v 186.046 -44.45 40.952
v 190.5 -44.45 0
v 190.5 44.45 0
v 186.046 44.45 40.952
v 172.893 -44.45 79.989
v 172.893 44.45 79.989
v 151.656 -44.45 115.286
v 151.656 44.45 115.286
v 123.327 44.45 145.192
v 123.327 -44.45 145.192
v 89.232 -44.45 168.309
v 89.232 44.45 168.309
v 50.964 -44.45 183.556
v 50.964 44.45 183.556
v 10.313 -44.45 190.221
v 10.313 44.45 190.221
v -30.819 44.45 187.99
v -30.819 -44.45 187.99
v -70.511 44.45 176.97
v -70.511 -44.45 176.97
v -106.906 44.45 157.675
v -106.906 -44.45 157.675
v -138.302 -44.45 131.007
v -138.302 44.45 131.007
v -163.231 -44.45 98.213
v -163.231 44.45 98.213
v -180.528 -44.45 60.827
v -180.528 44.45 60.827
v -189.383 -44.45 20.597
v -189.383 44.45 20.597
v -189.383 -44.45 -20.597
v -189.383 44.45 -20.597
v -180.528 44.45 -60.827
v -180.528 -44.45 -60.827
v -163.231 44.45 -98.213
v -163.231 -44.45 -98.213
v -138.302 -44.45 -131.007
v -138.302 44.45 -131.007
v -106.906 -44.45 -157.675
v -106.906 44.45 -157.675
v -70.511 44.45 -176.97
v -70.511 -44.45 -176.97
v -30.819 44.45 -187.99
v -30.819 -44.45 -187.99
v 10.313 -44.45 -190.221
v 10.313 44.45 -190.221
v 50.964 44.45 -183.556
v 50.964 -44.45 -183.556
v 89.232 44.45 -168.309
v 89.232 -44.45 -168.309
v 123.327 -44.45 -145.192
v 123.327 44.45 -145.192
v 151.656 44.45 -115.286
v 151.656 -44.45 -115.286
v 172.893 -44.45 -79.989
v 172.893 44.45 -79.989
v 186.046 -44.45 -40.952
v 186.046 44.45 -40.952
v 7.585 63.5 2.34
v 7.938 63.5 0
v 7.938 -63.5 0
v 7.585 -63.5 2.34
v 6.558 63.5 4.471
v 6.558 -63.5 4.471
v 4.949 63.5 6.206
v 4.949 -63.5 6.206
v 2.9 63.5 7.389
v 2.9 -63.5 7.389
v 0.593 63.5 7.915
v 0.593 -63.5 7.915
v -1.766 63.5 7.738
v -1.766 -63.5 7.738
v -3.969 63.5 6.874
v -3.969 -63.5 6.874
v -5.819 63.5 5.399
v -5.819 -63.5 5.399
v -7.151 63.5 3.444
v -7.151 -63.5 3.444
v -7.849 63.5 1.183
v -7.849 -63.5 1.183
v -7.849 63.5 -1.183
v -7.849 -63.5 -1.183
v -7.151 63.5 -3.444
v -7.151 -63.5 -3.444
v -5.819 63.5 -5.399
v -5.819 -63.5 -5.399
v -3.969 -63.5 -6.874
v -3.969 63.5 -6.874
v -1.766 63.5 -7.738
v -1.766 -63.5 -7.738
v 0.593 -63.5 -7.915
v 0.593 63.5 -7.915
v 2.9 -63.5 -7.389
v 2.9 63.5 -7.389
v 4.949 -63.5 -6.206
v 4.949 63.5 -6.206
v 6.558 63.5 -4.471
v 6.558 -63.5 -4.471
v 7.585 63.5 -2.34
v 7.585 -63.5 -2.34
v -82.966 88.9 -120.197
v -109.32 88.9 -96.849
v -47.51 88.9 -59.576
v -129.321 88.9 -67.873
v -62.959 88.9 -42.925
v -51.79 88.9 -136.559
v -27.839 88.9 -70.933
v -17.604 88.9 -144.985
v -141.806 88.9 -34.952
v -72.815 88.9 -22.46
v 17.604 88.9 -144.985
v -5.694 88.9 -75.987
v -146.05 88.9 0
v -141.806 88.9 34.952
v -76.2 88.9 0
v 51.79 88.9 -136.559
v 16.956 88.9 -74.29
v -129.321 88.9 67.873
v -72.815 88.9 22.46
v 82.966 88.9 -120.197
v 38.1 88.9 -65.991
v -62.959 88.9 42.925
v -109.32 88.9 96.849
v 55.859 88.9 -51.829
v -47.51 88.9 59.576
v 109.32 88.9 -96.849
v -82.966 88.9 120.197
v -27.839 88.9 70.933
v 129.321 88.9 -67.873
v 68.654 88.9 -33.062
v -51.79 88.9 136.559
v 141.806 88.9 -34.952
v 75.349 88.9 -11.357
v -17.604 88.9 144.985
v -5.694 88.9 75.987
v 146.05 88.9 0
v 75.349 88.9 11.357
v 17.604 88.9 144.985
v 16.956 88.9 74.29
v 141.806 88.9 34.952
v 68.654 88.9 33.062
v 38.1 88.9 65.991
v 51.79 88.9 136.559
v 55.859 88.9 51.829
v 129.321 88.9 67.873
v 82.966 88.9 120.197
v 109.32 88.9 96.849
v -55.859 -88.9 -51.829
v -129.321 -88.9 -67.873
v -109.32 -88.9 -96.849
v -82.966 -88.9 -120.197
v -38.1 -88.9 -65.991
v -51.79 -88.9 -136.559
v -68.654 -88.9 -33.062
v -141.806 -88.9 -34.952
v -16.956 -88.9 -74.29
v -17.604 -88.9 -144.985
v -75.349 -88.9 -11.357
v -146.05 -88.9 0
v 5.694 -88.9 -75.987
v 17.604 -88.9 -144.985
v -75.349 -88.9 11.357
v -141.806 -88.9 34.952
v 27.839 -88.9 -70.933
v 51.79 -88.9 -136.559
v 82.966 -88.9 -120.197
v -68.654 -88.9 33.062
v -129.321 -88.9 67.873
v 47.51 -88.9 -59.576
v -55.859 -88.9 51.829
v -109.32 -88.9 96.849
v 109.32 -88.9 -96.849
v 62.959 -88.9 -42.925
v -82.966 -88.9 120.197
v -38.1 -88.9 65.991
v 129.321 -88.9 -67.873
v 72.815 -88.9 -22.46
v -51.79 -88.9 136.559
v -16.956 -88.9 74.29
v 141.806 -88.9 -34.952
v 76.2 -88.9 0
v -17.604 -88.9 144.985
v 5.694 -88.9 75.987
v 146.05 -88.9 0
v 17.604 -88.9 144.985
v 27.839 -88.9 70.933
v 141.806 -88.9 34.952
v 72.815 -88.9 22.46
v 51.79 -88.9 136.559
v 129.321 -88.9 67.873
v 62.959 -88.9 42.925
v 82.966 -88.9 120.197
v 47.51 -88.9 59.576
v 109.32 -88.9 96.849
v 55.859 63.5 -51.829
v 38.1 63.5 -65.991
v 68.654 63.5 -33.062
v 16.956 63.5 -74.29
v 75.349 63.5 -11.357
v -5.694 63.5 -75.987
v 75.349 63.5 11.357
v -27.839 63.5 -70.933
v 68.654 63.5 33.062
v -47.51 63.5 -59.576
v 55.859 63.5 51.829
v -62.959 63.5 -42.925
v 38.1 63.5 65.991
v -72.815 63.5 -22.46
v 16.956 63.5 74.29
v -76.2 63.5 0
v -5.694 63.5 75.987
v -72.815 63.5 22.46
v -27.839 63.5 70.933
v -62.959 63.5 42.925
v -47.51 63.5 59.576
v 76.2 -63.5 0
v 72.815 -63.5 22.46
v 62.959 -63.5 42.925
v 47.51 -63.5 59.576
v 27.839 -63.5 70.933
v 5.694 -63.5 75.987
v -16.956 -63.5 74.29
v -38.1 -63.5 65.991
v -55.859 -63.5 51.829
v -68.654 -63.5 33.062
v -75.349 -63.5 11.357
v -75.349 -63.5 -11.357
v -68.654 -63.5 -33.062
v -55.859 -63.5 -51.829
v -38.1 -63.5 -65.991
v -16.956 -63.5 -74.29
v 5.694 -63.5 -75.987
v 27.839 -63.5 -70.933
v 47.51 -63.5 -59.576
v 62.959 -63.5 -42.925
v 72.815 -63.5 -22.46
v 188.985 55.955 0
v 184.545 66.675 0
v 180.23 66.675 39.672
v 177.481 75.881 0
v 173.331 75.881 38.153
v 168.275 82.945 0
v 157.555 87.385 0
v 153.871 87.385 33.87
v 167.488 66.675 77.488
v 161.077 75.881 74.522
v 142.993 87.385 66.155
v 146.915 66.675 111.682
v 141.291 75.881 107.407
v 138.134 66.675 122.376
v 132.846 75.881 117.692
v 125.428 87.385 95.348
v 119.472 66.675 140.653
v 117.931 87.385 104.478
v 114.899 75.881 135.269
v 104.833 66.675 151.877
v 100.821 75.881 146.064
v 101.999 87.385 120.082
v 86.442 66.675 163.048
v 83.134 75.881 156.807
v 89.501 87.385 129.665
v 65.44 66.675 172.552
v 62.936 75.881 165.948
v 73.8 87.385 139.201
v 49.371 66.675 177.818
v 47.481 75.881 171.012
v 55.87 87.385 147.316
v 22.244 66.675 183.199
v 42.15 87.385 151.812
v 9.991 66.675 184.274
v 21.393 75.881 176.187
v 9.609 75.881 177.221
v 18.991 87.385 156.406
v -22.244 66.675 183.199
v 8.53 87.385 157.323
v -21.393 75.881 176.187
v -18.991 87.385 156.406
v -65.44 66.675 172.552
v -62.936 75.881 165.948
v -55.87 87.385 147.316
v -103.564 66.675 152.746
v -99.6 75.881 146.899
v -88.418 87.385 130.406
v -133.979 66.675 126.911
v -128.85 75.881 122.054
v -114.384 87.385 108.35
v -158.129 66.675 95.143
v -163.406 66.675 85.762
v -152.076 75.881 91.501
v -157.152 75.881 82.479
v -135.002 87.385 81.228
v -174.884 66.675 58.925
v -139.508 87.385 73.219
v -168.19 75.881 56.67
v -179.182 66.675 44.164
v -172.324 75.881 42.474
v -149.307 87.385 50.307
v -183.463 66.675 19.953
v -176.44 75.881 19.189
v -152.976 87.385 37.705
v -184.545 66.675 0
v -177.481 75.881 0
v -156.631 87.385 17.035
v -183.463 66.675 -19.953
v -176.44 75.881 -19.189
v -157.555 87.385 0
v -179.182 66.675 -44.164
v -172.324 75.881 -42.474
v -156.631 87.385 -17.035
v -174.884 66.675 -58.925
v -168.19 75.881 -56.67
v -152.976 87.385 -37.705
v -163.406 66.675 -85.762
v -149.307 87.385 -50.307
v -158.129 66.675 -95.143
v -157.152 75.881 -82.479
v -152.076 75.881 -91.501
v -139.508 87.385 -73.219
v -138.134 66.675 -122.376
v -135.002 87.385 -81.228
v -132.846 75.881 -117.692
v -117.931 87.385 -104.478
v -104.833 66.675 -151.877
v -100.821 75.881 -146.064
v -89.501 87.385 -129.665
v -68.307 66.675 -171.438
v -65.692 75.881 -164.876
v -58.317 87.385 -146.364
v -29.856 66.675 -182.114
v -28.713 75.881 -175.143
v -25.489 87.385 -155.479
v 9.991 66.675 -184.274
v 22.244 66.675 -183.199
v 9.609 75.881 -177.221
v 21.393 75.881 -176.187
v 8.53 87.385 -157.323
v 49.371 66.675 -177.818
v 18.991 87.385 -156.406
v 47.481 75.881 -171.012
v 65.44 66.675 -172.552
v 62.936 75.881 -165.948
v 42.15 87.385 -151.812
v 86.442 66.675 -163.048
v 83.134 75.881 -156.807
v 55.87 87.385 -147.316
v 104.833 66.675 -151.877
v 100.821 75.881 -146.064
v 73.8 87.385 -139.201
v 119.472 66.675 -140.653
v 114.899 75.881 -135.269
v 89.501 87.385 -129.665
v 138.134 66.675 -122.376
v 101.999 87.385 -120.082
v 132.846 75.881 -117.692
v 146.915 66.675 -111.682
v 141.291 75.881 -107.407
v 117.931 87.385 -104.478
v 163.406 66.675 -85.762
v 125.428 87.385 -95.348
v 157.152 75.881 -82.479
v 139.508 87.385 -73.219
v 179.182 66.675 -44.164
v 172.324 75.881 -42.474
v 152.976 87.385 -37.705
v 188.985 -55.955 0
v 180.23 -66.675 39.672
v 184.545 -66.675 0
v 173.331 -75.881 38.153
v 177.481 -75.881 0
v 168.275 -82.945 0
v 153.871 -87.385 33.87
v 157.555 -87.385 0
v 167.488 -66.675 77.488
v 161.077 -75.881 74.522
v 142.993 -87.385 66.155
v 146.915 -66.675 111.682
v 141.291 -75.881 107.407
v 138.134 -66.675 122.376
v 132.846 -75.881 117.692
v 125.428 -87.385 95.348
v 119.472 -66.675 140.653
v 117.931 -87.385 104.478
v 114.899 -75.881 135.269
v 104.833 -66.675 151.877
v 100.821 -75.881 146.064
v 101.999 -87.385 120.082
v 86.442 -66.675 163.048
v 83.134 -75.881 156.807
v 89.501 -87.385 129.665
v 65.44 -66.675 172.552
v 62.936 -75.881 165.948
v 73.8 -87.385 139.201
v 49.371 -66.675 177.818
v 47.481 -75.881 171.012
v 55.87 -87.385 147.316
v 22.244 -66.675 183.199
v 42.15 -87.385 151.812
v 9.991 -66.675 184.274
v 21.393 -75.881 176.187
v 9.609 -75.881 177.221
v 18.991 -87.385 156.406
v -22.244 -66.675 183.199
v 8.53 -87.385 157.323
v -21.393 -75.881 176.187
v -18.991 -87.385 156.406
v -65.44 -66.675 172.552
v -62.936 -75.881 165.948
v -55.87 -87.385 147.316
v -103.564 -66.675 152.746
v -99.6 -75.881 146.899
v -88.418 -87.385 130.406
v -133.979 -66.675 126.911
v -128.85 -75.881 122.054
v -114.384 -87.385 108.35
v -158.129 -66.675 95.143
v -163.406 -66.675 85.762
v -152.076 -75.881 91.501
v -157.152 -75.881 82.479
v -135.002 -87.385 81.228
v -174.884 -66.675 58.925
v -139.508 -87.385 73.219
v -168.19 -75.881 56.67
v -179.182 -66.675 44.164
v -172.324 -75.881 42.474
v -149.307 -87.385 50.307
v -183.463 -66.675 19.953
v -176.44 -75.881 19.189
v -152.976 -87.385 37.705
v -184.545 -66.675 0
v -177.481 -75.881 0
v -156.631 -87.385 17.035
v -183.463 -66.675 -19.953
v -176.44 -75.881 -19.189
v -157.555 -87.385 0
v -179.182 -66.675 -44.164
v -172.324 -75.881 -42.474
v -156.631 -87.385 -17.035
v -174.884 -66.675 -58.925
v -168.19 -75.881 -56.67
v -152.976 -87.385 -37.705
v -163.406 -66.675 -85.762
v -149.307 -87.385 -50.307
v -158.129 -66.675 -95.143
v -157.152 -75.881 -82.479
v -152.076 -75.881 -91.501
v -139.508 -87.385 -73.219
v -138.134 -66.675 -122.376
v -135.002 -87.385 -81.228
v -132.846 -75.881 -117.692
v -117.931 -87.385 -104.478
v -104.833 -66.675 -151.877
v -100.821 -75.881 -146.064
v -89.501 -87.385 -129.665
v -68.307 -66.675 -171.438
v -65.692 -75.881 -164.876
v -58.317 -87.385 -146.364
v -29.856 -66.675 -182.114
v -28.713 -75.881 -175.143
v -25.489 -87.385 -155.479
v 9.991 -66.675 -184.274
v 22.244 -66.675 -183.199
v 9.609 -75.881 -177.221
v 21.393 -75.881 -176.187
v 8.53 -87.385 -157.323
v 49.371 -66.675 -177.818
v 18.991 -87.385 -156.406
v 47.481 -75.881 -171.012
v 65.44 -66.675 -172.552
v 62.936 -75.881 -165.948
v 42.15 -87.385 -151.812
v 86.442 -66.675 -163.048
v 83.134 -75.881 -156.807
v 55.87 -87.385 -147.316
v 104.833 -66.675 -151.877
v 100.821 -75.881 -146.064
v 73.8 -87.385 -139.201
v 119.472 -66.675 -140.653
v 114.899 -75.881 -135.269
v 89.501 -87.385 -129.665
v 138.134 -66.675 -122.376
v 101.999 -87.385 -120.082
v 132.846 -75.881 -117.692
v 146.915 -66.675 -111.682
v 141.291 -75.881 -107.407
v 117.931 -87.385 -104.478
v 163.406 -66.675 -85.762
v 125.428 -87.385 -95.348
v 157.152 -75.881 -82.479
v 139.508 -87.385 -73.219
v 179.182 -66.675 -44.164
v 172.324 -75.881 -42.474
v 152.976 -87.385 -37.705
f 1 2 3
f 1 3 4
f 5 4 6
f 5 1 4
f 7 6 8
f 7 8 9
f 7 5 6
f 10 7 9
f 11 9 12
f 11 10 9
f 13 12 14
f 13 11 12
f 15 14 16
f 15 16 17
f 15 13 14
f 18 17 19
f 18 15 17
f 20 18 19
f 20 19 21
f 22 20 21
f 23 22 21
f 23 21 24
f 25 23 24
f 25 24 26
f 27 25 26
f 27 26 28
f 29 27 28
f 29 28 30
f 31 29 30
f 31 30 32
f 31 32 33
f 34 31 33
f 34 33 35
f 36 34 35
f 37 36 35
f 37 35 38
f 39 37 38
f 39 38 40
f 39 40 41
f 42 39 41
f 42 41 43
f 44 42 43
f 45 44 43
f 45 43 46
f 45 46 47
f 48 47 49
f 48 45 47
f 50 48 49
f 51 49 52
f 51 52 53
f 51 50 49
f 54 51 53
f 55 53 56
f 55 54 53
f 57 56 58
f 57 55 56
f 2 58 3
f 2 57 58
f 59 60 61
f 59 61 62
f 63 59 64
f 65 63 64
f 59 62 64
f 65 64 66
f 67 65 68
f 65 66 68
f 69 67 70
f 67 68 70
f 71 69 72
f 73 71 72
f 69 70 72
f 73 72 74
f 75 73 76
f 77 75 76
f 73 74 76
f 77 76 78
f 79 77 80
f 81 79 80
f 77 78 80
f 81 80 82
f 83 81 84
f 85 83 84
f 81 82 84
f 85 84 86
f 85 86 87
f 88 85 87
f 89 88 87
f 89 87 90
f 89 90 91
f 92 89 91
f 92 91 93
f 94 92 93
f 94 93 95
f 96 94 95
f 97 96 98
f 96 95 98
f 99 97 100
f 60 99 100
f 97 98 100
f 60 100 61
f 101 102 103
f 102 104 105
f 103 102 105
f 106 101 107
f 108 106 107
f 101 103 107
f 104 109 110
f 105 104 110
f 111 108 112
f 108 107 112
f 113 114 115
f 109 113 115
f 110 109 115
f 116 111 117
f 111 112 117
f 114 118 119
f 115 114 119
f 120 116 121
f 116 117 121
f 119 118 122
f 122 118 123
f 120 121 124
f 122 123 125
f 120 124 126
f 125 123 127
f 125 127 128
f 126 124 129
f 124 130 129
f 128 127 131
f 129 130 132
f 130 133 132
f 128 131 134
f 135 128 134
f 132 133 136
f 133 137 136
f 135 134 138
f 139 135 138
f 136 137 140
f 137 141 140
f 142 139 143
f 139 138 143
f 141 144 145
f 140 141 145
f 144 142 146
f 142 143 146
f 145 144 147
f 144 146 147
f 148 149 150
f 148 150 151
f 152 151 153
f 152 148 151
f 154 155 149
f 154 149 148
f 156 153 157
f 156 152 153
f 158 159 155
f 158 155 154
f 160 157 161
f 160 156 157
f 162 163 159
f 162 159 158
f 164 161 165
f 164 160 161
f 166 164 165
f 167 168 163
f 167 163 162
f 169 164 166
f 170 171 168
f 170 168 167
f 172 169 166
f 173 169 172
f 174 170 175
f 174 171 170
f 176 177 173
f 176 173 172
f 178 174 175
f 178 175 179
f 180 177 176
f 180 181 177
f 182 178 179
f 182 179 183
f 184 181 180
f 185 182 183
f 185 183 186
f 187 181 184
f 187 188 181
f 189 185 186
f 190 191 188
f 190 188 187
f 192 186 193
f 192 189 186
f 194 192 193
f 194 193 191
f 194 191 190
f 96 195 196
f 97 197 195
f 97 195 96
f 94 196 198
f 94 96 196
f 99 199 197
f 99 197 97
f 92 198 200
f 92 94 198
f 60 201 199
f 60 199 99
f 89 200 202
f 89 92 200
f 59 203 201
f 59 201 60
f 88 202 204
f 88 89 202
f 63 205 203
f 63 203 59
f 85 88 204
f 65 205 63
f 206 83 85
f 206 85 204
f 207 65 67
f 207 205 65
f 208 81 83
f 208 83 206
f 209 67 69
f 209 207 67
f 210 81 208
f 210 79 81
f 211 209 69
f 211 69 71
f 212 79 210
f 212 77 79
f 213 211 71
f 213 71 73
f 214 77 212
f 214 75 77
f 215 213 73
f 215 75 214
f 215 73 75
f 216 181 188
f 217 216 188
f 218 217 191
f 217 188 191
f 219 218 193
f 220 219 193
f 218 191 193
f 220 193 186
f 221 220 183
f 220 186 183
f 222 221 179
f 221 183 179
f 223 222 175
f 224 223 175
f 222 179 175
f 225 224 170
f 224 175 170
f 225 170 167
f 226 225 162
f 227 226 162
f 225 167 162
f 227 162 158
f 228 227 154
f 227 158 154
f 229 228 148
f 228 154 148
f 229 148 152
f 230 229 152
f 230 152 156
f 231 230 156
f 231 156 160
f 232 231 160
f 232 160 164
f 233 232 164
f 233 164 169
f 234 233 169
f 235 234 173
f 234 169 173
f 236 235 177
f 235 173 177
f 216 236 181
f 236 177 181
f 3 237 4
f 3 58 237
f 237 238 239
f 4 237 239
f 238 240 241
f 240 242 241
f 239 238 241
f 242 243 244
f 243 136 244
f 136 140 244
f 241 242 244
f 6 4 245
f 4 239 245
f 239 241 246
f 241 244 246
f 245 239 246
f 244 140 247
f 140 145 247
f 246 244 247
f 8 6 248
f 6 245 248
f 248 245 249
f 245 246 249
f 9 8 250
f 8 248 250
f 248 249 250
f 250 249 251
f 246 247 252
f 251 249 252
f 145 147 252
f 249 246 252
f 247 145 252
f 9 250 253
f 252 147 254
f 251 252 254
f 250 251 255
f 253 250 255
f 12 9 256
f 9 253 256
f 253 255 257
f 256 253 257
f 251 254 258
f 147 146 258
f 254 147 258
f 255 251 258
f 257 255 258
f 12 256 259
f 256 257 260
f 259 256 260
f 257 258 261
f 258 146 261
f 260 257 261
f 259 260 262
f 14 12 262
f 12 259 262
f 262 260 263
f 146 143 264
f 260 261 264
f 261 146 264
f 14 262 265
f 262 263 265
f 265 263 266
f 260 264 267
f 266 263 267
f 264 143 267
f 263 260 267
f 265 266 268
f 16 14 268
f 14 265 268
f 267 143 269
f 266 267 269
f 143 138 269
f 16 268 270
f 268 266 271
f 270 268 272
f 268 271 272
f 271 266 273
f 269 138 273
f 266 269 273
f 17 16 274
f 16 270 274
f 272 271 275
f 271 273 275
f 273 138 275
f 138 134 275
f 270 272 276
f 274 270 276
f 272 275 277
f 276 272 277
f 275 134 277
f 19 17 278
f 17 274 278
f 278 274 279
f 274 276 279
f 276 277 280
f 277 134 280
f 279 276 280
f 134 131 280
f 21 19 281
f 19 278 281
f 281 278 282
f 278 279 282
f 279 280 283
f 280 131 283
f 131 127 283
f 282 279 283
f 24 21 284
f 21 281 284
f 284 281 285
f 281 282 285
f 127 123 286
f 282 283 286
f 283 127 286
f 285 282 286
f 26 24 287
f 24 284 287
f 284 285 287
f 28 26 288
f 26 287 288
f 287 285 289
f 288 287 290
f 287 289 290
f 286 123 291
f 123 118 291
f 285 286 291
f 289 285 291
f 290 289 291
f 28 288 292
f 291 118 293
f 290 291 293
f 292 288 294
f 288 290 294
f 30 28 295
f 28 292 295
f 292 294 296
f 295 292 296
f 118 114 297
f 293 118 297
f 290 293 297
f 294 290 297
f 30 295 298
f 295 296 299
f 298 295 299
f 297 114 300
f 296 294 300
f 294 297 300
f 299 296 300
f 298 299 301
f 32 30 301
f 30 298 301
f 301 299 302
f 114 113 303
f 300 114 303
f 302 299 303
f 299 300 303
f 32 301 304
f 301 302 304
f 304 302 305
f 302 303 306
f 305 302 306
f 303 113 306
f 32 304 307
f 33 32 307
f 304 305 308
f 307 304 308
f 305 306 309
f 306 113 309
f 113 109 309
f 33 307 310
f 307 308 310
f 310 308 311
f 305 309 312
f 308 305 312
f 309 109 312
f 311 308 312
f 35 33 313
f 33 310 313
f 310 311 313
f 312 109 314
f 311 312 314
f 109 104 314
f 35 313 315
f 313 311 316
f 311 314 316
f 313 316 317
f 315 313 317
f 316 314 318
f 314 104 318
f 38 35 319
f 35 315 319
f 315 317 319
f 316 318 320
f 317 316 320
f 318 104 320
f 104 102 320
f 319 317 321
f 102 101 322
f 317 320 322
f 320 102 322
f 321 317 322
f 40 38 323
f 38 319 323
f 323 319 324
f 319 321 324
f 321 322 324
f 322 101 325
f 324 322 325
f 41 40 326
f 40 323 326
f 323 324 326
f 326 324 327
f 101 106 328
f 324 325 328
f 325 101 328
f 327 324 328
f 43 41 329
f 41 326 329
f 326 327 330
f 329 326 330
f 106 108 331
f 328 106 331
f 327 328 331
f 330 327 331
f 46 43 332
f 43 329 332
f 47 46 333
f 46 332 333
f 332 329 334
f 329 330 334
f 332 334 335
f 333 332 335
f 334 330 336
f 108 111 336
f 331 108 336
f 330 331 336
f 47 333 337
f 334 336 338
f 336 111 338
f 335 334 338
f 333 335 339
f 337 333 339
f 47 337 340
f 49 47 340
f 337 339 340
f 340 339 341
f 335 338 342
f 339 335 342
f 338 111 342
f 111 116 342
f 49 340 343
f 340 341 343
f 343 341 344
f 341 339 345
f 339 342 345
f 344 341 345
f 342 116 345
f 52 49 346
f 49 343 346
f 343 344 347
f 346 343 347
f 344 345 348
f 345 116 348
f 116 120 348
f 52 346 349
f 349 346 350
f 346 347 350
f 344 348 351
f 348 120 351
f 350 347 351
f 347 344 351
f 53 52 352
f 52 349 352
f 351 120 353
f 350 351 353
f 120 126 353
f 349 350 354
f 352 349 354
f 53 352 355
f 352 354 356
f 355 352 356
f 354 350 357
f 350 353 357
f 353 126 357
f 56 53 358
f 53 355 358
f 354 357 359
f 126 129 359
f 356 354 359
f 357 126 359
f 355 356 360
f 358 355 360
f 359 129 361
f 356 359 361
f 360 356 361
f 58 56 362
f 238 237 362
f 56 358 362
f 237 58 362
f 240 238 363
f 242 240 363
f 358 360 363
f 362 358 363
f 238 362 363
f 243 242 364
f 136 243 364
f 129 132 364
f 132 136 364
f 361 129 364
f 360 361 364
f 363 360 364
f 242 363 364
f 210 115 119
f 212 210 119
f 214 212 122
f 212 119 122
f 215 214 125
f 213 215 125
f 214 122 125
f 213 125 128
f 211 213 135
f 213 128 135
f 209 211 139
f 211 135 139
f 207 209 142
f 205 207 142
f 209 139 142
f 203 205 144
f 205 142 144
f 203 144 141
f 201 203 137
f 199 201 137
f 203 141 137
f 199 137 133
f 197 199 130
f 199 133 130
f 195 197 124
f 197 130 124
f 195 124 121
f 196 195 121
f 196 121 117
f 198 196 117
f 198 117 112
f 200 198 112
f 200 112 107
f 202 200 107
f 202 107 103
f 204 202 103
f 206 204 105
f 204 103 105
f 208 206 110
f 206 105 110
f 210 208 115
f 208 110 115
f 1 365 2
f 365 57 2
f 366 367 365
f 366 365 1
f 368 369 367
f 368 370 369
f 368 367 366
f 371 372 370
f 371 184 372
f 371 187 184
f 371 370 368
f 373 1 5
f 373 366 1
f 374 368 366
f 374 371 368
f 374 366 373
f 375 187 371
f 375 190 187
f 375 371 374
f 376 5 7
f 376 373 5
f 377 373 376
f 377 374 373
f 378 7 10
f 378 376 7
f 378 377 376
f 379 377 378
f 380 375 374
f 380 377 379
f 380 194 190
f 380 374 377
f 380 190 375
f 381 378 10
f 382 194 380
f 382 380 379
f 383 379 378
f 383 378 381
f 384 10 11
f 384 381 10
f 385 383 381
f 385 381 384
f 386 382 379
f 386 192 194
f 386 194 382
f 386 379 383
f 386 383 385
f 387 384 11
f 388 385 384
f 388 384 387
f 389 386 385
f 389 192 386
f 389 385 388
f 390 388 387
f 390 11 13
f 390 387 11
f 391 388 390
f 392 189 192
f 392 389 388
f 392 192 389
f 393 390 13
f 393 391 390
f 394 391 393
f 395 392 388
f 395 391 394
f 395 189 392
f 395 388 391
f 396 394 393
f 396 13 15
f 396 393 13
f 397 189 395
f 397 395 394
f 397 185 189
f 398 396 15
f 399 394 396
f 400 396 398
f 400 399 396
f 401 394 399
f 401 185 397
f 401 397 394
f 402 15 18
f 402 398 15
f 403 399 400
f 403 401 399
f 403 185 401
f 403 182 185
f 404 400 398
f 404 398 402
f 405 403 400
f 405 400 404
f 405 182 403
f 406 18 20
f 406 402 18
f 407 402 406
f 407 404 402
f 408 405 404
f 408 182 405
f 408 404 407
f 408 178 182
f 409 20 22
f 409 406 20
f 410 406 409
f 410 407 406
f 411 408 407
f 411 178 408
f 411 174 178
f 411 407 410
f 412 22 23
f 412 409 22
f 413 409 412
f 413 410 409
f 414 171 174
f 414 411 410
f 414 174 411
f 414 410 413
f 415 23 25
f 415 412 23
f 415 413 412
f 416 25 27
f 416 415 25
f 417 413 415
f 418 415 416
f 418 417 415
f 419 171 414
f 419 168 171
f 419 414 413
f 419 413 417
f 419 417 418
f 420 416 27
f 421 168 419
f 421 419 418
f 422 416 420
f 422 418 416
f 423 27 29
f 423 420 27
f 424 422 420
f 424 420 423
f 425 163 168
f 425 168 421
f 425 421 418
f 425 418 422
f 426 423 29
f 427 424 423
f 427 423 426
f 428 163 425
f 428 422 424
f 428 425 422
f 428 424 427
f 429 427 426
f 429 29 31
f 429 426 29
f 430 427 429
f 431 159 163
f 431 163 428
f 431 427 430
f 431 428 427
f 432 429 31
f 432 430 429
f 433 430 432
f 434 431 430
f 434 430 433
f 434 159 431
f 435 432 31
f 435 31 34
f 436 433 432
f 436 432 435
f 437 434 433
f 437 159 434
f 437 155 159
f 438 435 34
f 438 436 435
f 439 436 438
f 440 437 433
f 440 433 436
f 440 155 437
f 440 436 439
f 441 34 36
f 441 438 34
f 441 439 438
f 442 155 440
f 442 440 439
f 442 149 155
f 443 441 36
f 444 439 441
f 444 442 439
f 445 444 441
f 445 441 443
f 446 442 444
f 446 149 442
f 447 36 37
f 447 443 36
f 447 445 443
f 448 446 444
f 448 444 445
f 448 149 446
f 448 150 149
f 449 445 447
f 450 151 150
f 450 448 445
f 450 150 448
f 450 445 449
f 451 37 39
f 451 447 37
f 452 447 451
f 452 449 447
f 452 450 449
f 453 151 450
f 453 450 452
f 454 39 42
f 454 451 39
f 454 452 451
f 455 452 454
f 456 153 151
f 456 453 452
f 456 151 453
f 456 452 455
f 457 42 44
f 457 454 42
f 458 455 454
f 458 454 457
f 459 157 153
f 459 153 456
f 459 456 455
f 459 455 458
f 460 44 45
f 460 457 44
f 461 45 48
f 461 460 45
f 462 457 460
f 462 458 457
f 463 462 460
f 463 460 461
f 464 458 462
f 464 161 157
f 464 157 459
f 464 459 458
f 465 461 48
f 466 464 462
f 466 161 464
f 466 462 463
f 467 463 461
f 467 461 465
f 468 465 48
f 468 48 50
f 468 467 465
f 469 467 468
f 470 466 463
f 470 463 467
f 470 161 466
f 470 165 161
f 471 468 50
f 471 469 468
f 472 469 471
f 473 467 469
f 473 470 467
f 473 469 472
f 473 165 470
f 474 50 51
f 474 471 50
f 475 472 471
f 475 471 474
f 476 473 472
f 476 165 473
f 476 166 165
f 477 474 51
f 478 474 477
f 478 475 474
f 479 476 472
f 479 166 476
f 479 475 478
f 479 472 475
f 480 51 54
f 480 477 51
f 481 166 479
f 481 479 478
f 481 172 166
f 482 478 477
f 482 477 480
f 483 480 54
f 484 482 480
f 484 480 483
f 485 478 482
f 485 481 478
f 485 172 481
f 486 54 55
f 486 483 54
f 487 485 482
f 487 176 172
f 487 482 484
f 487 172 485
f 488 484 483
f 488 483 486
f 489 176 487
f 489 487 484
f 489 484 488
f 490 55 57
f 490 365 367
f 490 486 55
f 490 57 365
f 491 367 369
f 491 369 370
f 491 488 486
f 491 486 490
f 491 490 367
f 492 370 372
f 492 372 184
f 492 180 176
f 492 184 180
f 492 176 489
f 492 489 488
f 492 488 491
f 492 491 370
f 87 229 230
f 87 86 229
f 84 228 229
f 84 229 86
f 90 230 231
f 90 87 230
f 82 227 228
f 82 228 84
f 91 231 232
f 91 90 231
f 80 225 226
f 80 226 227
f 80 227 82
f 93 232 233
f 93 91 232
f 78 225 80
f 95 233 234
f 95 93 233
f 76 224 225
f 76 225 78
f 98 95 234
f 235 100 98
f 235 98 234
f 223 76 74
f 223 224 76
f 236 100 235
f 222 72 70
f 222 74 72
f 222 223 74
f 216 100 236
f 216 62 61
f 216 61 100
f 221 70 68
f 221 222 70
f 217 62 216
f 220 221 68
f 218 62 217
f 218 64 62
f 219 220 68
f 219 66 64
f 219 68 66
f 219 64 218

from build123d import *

# Parameters (mm, degrees)
F0_R     = 190.5
F1_DEPTH = 88.9
F2_R     = 76.2
F3_DEPTH = 25.4
F4_R     = 76.2
F5_DEPTH = 25.4
F6_R     = 7.9375
F7_DEPTH = 127
F8_R     = 44.45


with BuildPart() as f1:
    # F0 (on Front) → F1 (new body, symmetric)
    with BuildSketch(Plane.XZ):
        Circle(F0_R)
    extrude(amount=F1_DEPTH, both=True)

    # F2 (on face) → F3 (cut)
    with BuildSketch(Plane.XZ.offset(88.9)):
        Circle(F2_R)
    extrude(amount=-F3_DEPTH, mode=Mode.SUBTRACT)

    # F4 (on face) → F5 (cut)
    with BuildSketch(Plane(origin=(0, 88.9, 0), x_dir=(-1, 0, 0), z_dir=(0, 1, 0))):
        Circle(F4_R)
    extrude(amount=-F5_DEPTH, mode=Mode.SUBTRACT)

    # F6 (on face) → F7 (cut, symmetric)
    with BuildSketch(Plane.XZ.offset(63.5)):
        Circle(F6_R)
    extrude(amount=F7_DEPTH, both=True, mode=Mode.SUBTRACT)

    # F8
    f8_edges = [f1.edges().sort_by_distance(p)[0] for p in [
        (-190.5, 88.9, 0),
        (-190.5, -88.9, 0),
    ]]
    fillet(f8_edges, radius=F8_R)


solid = f1.part
